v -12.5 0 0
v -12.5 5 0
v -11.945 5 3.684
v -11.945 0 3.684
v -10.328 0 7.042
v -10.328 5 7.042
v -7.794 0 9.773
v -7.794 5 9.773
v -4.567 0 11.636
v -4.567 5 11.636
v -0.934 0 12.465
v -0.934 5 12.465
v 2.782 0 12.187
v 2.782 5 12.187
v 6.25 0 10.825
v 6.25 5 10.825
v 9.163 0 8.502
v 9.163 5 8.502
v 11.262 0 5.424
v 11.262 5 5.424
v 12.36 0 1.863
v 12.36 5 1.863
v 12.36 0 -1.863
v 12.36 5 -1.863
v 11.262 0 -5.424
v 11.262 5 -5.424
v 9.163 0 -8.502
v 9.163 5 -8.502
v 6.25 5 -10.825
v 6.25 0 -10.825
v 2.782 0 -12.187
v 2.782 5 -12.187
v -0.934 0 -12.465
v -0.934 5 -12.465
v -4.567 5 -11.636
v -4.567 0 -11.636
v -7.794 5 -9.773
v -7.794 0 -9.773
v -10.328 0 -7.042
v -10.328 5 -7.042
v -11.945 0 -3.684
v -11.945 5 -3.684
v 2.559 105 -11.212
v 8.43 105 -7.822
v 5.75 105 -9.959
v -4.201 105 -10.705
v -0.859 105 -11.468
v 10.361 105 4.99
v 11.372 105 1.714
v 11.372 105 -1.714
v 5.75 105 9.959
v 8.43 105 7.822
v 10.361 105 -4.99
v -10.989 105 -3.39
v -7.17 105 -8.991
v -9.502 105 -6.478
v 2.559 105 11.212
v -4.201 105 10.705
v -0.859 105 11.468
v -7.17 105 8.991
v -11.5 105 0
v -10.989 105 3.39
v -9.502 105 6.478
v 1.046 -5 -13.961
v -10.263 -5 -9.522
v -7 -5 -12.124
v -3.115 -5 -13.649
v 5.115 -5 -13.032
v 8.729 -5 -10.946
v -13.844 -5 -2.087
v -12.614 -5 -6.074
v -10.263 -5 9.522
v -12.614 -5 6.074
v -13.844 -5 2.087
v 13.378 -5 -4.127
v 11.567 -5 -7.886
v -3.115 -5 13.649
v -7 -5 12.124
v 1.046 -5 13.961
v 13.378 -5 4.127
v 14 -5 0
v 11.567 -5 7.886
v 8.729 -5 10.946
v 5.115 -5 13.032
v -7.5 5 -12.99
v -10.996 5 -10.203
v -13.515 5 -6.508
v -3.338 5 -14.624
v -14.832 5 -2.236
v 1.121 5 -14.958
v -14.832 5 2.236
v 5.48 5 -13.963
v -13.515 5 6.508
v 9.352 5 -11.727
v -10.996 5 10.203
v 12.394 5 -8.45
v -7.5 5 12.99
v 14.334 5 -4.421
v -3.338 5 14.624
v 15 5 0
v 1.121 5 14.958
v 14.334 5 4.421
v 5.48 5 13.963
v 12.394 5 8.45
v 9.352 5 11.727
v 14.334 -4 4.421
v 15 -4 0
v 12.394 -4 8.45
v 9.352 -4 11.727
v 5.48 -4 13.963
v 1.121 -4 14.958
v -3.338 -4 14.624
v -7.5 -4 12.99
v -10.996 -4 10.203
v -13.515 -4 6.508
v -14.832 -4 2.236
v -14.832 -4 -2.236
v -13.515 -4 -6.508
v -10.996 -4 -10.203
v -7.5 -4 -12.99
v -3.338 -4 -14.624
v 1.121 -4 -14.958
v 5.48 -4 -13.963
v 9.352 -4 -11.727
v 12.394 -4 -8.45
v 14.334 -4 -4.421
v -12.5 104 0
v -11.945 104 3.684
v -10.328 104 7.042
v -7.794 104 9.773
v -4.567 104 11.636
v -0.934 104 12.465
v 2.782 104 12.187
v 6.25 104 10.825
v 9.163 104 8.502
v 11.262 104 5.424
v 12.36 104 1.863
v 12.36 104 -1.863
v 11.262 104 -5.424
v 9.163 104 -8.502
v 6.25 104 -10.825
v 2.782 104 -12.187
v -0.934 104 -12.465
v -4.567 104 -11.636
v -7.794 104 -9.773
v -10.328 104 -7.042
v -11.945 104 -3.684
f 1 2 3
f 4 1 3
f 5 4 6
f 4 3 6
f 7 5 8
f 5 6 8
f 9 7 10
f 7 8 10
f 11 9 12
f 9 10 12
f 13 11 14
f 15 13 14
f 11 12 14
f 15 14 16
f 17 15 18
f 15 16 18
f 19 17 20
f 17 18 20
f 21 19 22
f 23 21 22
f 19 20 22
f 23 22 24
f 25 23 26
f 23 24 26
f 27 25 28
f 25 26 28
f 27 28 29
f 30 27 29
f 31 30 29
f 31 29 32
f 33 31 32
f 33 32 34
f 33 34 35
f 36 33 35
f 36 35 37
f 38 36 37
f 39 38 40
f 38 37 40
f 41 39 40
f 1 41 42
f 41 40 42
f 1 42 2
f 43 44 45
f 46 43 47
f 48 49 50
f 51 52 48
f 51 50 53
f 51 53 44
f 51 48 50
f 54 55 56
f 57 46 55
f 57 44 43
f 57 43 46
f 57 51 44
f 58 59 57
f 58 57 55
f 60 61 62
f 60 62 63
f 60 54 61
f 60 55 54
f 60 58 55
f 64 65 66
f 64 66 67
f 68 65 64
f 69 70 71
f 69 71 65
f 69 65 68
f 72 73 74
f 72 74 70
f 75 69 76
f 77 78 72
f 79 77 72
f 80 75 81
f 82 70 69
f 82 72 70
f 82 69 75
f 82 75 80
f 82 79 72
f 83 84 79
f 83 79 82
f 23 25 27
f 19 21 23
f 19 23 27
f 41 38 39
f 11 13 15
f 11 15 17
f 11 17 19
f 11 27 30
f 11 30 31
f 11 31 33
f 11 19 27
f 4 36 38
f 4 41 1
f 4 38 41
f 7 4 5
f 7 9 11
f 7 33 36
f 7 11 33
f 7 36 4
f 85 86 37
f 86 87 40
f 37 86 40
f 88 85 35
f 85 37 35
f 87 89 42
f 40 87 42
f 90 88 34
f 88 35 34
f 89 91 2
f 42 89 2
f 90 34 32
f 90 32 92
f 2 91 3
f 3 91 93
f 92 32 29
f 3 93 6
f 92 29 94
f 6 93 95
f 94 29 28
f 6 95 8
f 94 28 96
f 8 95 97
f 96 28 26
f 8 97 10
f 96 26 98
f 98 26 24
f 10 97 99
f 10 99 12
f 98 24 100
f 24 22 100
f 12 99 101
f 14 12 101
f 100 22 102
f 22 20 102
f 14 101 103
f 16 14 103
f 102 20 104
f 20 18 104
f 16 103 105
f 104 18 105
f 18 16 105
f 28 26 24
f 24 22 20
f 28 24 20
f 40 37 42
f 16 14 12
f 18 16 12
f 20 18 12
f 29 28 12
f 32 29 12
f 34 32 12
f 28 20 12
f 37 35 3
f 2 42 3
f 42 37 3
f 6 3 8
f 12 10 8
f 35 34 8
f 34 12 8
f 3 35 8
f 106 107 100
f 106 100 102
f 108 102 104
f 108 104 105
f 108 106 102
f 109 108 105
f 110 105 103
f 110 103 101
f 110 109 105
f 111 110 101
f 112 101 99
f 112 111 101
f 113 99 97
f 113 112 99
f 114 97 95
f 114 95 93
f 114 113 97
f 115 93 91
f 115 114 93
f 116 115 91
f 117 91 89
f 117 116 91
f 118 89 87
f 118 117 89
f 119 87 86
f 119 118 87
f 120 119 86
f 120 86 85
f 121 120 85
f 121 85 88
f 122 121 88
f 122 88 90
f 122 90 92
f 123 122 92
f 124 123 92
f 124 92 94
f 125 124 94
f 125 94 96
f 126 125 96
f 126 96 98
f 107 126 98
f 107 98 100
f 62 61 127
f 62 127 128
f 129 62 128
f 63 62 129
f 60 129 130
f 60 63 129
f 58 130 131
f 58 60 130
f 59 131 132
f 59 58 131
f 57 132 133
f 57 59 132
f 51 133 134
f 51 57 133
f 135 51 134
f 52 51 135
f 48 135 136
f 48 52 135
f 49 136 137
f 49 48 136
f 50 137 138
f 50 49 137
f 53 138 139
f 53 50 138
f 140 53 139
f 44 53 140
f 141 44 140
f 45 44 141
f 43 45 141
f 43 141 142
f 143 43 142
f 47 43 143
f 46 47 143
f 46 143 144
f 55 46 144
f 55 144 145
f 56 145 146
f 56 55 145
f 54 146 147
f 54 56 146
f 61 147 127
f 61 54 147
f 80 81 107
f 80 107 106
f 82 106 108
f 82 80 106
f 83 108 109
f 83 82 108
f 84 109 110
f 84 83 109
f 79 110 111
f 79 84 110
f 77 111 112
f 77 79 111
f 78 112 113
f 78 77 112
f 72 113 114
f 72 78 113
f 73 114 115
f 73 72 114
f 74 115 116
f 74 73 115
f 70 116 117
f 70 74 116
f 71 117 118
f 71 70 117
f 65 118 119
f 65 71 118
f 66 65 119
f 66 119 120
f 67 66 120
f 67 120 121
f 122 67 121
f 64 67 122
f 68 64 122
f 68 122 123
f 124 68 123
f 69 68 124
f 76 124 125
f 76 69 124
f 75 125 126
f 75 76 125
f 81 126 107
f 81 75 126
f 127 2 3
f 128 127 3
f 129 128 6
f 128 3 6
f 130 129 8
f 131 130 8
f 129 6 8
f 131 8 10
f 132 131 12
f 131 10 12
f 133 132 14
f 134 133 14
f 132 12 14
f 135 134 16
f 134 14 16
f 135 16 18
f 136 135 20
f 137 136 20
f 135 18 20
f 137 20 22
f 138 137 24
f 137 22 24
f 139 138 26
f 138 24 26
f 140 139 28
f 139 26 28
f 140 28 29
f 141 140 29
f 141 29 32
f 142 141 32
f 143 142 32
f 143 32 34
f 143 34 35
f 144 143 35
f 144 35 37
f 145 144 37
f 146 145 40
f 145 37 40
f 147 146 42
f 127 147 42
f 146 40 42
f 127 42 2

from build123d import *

# Parameters (mm, degrees)
F0_R     = 15
F1_DEPTH = 5
F2_SIZE  = 1
F3_R     = 12.5
F4_DEPTH = 5
F5_DEPTH = 100
F6_SIZE  = 1


with BuildPart() as f1:
    # F0 (on Front) → F1 (new body, symmetric)
    with BuildSketch(Plane.XZ):
        Circle(F0_R)
    extrude(amount=F1_DEPTH, both=True)

    # F2
    f2_edges = [f1.edges().sort_by_distance(p)[0] for p in [
        (-15, -5, 0),
    ]]
    chamfer(f2_edges, length=F2_SIZE)

    # F3 (on face) → F4 (cut)
    with BuildSketch(Plane(origin=(0, 5, 0), x_dir=(-1, 0, 0), z_dir=(0, 1, 0))):
        Circle(F3_R)
    extrude(amount=-F4_DEPTH, mode=Mode.SUBTRACT)


with BuildPart() as f5:
    # F3 (on face) → F5 (new body)
    with BuildSketch(Plane(origin=(0, 5, 0), x_dir=(-1, 0, 0), z_dir=(0, 1, 0))):
        Circle(F3_R)
    extrude(amount=F5_DEPTH)

    # F6
    f6_edges = [f5.edges().sort_by_distance(p)[0] for p in [
        (12.5, 105, 0),
    ]]
    chamfer(f6_edges, length=F6_SIZE)


solid = Compound([f1.part, f5.part])
